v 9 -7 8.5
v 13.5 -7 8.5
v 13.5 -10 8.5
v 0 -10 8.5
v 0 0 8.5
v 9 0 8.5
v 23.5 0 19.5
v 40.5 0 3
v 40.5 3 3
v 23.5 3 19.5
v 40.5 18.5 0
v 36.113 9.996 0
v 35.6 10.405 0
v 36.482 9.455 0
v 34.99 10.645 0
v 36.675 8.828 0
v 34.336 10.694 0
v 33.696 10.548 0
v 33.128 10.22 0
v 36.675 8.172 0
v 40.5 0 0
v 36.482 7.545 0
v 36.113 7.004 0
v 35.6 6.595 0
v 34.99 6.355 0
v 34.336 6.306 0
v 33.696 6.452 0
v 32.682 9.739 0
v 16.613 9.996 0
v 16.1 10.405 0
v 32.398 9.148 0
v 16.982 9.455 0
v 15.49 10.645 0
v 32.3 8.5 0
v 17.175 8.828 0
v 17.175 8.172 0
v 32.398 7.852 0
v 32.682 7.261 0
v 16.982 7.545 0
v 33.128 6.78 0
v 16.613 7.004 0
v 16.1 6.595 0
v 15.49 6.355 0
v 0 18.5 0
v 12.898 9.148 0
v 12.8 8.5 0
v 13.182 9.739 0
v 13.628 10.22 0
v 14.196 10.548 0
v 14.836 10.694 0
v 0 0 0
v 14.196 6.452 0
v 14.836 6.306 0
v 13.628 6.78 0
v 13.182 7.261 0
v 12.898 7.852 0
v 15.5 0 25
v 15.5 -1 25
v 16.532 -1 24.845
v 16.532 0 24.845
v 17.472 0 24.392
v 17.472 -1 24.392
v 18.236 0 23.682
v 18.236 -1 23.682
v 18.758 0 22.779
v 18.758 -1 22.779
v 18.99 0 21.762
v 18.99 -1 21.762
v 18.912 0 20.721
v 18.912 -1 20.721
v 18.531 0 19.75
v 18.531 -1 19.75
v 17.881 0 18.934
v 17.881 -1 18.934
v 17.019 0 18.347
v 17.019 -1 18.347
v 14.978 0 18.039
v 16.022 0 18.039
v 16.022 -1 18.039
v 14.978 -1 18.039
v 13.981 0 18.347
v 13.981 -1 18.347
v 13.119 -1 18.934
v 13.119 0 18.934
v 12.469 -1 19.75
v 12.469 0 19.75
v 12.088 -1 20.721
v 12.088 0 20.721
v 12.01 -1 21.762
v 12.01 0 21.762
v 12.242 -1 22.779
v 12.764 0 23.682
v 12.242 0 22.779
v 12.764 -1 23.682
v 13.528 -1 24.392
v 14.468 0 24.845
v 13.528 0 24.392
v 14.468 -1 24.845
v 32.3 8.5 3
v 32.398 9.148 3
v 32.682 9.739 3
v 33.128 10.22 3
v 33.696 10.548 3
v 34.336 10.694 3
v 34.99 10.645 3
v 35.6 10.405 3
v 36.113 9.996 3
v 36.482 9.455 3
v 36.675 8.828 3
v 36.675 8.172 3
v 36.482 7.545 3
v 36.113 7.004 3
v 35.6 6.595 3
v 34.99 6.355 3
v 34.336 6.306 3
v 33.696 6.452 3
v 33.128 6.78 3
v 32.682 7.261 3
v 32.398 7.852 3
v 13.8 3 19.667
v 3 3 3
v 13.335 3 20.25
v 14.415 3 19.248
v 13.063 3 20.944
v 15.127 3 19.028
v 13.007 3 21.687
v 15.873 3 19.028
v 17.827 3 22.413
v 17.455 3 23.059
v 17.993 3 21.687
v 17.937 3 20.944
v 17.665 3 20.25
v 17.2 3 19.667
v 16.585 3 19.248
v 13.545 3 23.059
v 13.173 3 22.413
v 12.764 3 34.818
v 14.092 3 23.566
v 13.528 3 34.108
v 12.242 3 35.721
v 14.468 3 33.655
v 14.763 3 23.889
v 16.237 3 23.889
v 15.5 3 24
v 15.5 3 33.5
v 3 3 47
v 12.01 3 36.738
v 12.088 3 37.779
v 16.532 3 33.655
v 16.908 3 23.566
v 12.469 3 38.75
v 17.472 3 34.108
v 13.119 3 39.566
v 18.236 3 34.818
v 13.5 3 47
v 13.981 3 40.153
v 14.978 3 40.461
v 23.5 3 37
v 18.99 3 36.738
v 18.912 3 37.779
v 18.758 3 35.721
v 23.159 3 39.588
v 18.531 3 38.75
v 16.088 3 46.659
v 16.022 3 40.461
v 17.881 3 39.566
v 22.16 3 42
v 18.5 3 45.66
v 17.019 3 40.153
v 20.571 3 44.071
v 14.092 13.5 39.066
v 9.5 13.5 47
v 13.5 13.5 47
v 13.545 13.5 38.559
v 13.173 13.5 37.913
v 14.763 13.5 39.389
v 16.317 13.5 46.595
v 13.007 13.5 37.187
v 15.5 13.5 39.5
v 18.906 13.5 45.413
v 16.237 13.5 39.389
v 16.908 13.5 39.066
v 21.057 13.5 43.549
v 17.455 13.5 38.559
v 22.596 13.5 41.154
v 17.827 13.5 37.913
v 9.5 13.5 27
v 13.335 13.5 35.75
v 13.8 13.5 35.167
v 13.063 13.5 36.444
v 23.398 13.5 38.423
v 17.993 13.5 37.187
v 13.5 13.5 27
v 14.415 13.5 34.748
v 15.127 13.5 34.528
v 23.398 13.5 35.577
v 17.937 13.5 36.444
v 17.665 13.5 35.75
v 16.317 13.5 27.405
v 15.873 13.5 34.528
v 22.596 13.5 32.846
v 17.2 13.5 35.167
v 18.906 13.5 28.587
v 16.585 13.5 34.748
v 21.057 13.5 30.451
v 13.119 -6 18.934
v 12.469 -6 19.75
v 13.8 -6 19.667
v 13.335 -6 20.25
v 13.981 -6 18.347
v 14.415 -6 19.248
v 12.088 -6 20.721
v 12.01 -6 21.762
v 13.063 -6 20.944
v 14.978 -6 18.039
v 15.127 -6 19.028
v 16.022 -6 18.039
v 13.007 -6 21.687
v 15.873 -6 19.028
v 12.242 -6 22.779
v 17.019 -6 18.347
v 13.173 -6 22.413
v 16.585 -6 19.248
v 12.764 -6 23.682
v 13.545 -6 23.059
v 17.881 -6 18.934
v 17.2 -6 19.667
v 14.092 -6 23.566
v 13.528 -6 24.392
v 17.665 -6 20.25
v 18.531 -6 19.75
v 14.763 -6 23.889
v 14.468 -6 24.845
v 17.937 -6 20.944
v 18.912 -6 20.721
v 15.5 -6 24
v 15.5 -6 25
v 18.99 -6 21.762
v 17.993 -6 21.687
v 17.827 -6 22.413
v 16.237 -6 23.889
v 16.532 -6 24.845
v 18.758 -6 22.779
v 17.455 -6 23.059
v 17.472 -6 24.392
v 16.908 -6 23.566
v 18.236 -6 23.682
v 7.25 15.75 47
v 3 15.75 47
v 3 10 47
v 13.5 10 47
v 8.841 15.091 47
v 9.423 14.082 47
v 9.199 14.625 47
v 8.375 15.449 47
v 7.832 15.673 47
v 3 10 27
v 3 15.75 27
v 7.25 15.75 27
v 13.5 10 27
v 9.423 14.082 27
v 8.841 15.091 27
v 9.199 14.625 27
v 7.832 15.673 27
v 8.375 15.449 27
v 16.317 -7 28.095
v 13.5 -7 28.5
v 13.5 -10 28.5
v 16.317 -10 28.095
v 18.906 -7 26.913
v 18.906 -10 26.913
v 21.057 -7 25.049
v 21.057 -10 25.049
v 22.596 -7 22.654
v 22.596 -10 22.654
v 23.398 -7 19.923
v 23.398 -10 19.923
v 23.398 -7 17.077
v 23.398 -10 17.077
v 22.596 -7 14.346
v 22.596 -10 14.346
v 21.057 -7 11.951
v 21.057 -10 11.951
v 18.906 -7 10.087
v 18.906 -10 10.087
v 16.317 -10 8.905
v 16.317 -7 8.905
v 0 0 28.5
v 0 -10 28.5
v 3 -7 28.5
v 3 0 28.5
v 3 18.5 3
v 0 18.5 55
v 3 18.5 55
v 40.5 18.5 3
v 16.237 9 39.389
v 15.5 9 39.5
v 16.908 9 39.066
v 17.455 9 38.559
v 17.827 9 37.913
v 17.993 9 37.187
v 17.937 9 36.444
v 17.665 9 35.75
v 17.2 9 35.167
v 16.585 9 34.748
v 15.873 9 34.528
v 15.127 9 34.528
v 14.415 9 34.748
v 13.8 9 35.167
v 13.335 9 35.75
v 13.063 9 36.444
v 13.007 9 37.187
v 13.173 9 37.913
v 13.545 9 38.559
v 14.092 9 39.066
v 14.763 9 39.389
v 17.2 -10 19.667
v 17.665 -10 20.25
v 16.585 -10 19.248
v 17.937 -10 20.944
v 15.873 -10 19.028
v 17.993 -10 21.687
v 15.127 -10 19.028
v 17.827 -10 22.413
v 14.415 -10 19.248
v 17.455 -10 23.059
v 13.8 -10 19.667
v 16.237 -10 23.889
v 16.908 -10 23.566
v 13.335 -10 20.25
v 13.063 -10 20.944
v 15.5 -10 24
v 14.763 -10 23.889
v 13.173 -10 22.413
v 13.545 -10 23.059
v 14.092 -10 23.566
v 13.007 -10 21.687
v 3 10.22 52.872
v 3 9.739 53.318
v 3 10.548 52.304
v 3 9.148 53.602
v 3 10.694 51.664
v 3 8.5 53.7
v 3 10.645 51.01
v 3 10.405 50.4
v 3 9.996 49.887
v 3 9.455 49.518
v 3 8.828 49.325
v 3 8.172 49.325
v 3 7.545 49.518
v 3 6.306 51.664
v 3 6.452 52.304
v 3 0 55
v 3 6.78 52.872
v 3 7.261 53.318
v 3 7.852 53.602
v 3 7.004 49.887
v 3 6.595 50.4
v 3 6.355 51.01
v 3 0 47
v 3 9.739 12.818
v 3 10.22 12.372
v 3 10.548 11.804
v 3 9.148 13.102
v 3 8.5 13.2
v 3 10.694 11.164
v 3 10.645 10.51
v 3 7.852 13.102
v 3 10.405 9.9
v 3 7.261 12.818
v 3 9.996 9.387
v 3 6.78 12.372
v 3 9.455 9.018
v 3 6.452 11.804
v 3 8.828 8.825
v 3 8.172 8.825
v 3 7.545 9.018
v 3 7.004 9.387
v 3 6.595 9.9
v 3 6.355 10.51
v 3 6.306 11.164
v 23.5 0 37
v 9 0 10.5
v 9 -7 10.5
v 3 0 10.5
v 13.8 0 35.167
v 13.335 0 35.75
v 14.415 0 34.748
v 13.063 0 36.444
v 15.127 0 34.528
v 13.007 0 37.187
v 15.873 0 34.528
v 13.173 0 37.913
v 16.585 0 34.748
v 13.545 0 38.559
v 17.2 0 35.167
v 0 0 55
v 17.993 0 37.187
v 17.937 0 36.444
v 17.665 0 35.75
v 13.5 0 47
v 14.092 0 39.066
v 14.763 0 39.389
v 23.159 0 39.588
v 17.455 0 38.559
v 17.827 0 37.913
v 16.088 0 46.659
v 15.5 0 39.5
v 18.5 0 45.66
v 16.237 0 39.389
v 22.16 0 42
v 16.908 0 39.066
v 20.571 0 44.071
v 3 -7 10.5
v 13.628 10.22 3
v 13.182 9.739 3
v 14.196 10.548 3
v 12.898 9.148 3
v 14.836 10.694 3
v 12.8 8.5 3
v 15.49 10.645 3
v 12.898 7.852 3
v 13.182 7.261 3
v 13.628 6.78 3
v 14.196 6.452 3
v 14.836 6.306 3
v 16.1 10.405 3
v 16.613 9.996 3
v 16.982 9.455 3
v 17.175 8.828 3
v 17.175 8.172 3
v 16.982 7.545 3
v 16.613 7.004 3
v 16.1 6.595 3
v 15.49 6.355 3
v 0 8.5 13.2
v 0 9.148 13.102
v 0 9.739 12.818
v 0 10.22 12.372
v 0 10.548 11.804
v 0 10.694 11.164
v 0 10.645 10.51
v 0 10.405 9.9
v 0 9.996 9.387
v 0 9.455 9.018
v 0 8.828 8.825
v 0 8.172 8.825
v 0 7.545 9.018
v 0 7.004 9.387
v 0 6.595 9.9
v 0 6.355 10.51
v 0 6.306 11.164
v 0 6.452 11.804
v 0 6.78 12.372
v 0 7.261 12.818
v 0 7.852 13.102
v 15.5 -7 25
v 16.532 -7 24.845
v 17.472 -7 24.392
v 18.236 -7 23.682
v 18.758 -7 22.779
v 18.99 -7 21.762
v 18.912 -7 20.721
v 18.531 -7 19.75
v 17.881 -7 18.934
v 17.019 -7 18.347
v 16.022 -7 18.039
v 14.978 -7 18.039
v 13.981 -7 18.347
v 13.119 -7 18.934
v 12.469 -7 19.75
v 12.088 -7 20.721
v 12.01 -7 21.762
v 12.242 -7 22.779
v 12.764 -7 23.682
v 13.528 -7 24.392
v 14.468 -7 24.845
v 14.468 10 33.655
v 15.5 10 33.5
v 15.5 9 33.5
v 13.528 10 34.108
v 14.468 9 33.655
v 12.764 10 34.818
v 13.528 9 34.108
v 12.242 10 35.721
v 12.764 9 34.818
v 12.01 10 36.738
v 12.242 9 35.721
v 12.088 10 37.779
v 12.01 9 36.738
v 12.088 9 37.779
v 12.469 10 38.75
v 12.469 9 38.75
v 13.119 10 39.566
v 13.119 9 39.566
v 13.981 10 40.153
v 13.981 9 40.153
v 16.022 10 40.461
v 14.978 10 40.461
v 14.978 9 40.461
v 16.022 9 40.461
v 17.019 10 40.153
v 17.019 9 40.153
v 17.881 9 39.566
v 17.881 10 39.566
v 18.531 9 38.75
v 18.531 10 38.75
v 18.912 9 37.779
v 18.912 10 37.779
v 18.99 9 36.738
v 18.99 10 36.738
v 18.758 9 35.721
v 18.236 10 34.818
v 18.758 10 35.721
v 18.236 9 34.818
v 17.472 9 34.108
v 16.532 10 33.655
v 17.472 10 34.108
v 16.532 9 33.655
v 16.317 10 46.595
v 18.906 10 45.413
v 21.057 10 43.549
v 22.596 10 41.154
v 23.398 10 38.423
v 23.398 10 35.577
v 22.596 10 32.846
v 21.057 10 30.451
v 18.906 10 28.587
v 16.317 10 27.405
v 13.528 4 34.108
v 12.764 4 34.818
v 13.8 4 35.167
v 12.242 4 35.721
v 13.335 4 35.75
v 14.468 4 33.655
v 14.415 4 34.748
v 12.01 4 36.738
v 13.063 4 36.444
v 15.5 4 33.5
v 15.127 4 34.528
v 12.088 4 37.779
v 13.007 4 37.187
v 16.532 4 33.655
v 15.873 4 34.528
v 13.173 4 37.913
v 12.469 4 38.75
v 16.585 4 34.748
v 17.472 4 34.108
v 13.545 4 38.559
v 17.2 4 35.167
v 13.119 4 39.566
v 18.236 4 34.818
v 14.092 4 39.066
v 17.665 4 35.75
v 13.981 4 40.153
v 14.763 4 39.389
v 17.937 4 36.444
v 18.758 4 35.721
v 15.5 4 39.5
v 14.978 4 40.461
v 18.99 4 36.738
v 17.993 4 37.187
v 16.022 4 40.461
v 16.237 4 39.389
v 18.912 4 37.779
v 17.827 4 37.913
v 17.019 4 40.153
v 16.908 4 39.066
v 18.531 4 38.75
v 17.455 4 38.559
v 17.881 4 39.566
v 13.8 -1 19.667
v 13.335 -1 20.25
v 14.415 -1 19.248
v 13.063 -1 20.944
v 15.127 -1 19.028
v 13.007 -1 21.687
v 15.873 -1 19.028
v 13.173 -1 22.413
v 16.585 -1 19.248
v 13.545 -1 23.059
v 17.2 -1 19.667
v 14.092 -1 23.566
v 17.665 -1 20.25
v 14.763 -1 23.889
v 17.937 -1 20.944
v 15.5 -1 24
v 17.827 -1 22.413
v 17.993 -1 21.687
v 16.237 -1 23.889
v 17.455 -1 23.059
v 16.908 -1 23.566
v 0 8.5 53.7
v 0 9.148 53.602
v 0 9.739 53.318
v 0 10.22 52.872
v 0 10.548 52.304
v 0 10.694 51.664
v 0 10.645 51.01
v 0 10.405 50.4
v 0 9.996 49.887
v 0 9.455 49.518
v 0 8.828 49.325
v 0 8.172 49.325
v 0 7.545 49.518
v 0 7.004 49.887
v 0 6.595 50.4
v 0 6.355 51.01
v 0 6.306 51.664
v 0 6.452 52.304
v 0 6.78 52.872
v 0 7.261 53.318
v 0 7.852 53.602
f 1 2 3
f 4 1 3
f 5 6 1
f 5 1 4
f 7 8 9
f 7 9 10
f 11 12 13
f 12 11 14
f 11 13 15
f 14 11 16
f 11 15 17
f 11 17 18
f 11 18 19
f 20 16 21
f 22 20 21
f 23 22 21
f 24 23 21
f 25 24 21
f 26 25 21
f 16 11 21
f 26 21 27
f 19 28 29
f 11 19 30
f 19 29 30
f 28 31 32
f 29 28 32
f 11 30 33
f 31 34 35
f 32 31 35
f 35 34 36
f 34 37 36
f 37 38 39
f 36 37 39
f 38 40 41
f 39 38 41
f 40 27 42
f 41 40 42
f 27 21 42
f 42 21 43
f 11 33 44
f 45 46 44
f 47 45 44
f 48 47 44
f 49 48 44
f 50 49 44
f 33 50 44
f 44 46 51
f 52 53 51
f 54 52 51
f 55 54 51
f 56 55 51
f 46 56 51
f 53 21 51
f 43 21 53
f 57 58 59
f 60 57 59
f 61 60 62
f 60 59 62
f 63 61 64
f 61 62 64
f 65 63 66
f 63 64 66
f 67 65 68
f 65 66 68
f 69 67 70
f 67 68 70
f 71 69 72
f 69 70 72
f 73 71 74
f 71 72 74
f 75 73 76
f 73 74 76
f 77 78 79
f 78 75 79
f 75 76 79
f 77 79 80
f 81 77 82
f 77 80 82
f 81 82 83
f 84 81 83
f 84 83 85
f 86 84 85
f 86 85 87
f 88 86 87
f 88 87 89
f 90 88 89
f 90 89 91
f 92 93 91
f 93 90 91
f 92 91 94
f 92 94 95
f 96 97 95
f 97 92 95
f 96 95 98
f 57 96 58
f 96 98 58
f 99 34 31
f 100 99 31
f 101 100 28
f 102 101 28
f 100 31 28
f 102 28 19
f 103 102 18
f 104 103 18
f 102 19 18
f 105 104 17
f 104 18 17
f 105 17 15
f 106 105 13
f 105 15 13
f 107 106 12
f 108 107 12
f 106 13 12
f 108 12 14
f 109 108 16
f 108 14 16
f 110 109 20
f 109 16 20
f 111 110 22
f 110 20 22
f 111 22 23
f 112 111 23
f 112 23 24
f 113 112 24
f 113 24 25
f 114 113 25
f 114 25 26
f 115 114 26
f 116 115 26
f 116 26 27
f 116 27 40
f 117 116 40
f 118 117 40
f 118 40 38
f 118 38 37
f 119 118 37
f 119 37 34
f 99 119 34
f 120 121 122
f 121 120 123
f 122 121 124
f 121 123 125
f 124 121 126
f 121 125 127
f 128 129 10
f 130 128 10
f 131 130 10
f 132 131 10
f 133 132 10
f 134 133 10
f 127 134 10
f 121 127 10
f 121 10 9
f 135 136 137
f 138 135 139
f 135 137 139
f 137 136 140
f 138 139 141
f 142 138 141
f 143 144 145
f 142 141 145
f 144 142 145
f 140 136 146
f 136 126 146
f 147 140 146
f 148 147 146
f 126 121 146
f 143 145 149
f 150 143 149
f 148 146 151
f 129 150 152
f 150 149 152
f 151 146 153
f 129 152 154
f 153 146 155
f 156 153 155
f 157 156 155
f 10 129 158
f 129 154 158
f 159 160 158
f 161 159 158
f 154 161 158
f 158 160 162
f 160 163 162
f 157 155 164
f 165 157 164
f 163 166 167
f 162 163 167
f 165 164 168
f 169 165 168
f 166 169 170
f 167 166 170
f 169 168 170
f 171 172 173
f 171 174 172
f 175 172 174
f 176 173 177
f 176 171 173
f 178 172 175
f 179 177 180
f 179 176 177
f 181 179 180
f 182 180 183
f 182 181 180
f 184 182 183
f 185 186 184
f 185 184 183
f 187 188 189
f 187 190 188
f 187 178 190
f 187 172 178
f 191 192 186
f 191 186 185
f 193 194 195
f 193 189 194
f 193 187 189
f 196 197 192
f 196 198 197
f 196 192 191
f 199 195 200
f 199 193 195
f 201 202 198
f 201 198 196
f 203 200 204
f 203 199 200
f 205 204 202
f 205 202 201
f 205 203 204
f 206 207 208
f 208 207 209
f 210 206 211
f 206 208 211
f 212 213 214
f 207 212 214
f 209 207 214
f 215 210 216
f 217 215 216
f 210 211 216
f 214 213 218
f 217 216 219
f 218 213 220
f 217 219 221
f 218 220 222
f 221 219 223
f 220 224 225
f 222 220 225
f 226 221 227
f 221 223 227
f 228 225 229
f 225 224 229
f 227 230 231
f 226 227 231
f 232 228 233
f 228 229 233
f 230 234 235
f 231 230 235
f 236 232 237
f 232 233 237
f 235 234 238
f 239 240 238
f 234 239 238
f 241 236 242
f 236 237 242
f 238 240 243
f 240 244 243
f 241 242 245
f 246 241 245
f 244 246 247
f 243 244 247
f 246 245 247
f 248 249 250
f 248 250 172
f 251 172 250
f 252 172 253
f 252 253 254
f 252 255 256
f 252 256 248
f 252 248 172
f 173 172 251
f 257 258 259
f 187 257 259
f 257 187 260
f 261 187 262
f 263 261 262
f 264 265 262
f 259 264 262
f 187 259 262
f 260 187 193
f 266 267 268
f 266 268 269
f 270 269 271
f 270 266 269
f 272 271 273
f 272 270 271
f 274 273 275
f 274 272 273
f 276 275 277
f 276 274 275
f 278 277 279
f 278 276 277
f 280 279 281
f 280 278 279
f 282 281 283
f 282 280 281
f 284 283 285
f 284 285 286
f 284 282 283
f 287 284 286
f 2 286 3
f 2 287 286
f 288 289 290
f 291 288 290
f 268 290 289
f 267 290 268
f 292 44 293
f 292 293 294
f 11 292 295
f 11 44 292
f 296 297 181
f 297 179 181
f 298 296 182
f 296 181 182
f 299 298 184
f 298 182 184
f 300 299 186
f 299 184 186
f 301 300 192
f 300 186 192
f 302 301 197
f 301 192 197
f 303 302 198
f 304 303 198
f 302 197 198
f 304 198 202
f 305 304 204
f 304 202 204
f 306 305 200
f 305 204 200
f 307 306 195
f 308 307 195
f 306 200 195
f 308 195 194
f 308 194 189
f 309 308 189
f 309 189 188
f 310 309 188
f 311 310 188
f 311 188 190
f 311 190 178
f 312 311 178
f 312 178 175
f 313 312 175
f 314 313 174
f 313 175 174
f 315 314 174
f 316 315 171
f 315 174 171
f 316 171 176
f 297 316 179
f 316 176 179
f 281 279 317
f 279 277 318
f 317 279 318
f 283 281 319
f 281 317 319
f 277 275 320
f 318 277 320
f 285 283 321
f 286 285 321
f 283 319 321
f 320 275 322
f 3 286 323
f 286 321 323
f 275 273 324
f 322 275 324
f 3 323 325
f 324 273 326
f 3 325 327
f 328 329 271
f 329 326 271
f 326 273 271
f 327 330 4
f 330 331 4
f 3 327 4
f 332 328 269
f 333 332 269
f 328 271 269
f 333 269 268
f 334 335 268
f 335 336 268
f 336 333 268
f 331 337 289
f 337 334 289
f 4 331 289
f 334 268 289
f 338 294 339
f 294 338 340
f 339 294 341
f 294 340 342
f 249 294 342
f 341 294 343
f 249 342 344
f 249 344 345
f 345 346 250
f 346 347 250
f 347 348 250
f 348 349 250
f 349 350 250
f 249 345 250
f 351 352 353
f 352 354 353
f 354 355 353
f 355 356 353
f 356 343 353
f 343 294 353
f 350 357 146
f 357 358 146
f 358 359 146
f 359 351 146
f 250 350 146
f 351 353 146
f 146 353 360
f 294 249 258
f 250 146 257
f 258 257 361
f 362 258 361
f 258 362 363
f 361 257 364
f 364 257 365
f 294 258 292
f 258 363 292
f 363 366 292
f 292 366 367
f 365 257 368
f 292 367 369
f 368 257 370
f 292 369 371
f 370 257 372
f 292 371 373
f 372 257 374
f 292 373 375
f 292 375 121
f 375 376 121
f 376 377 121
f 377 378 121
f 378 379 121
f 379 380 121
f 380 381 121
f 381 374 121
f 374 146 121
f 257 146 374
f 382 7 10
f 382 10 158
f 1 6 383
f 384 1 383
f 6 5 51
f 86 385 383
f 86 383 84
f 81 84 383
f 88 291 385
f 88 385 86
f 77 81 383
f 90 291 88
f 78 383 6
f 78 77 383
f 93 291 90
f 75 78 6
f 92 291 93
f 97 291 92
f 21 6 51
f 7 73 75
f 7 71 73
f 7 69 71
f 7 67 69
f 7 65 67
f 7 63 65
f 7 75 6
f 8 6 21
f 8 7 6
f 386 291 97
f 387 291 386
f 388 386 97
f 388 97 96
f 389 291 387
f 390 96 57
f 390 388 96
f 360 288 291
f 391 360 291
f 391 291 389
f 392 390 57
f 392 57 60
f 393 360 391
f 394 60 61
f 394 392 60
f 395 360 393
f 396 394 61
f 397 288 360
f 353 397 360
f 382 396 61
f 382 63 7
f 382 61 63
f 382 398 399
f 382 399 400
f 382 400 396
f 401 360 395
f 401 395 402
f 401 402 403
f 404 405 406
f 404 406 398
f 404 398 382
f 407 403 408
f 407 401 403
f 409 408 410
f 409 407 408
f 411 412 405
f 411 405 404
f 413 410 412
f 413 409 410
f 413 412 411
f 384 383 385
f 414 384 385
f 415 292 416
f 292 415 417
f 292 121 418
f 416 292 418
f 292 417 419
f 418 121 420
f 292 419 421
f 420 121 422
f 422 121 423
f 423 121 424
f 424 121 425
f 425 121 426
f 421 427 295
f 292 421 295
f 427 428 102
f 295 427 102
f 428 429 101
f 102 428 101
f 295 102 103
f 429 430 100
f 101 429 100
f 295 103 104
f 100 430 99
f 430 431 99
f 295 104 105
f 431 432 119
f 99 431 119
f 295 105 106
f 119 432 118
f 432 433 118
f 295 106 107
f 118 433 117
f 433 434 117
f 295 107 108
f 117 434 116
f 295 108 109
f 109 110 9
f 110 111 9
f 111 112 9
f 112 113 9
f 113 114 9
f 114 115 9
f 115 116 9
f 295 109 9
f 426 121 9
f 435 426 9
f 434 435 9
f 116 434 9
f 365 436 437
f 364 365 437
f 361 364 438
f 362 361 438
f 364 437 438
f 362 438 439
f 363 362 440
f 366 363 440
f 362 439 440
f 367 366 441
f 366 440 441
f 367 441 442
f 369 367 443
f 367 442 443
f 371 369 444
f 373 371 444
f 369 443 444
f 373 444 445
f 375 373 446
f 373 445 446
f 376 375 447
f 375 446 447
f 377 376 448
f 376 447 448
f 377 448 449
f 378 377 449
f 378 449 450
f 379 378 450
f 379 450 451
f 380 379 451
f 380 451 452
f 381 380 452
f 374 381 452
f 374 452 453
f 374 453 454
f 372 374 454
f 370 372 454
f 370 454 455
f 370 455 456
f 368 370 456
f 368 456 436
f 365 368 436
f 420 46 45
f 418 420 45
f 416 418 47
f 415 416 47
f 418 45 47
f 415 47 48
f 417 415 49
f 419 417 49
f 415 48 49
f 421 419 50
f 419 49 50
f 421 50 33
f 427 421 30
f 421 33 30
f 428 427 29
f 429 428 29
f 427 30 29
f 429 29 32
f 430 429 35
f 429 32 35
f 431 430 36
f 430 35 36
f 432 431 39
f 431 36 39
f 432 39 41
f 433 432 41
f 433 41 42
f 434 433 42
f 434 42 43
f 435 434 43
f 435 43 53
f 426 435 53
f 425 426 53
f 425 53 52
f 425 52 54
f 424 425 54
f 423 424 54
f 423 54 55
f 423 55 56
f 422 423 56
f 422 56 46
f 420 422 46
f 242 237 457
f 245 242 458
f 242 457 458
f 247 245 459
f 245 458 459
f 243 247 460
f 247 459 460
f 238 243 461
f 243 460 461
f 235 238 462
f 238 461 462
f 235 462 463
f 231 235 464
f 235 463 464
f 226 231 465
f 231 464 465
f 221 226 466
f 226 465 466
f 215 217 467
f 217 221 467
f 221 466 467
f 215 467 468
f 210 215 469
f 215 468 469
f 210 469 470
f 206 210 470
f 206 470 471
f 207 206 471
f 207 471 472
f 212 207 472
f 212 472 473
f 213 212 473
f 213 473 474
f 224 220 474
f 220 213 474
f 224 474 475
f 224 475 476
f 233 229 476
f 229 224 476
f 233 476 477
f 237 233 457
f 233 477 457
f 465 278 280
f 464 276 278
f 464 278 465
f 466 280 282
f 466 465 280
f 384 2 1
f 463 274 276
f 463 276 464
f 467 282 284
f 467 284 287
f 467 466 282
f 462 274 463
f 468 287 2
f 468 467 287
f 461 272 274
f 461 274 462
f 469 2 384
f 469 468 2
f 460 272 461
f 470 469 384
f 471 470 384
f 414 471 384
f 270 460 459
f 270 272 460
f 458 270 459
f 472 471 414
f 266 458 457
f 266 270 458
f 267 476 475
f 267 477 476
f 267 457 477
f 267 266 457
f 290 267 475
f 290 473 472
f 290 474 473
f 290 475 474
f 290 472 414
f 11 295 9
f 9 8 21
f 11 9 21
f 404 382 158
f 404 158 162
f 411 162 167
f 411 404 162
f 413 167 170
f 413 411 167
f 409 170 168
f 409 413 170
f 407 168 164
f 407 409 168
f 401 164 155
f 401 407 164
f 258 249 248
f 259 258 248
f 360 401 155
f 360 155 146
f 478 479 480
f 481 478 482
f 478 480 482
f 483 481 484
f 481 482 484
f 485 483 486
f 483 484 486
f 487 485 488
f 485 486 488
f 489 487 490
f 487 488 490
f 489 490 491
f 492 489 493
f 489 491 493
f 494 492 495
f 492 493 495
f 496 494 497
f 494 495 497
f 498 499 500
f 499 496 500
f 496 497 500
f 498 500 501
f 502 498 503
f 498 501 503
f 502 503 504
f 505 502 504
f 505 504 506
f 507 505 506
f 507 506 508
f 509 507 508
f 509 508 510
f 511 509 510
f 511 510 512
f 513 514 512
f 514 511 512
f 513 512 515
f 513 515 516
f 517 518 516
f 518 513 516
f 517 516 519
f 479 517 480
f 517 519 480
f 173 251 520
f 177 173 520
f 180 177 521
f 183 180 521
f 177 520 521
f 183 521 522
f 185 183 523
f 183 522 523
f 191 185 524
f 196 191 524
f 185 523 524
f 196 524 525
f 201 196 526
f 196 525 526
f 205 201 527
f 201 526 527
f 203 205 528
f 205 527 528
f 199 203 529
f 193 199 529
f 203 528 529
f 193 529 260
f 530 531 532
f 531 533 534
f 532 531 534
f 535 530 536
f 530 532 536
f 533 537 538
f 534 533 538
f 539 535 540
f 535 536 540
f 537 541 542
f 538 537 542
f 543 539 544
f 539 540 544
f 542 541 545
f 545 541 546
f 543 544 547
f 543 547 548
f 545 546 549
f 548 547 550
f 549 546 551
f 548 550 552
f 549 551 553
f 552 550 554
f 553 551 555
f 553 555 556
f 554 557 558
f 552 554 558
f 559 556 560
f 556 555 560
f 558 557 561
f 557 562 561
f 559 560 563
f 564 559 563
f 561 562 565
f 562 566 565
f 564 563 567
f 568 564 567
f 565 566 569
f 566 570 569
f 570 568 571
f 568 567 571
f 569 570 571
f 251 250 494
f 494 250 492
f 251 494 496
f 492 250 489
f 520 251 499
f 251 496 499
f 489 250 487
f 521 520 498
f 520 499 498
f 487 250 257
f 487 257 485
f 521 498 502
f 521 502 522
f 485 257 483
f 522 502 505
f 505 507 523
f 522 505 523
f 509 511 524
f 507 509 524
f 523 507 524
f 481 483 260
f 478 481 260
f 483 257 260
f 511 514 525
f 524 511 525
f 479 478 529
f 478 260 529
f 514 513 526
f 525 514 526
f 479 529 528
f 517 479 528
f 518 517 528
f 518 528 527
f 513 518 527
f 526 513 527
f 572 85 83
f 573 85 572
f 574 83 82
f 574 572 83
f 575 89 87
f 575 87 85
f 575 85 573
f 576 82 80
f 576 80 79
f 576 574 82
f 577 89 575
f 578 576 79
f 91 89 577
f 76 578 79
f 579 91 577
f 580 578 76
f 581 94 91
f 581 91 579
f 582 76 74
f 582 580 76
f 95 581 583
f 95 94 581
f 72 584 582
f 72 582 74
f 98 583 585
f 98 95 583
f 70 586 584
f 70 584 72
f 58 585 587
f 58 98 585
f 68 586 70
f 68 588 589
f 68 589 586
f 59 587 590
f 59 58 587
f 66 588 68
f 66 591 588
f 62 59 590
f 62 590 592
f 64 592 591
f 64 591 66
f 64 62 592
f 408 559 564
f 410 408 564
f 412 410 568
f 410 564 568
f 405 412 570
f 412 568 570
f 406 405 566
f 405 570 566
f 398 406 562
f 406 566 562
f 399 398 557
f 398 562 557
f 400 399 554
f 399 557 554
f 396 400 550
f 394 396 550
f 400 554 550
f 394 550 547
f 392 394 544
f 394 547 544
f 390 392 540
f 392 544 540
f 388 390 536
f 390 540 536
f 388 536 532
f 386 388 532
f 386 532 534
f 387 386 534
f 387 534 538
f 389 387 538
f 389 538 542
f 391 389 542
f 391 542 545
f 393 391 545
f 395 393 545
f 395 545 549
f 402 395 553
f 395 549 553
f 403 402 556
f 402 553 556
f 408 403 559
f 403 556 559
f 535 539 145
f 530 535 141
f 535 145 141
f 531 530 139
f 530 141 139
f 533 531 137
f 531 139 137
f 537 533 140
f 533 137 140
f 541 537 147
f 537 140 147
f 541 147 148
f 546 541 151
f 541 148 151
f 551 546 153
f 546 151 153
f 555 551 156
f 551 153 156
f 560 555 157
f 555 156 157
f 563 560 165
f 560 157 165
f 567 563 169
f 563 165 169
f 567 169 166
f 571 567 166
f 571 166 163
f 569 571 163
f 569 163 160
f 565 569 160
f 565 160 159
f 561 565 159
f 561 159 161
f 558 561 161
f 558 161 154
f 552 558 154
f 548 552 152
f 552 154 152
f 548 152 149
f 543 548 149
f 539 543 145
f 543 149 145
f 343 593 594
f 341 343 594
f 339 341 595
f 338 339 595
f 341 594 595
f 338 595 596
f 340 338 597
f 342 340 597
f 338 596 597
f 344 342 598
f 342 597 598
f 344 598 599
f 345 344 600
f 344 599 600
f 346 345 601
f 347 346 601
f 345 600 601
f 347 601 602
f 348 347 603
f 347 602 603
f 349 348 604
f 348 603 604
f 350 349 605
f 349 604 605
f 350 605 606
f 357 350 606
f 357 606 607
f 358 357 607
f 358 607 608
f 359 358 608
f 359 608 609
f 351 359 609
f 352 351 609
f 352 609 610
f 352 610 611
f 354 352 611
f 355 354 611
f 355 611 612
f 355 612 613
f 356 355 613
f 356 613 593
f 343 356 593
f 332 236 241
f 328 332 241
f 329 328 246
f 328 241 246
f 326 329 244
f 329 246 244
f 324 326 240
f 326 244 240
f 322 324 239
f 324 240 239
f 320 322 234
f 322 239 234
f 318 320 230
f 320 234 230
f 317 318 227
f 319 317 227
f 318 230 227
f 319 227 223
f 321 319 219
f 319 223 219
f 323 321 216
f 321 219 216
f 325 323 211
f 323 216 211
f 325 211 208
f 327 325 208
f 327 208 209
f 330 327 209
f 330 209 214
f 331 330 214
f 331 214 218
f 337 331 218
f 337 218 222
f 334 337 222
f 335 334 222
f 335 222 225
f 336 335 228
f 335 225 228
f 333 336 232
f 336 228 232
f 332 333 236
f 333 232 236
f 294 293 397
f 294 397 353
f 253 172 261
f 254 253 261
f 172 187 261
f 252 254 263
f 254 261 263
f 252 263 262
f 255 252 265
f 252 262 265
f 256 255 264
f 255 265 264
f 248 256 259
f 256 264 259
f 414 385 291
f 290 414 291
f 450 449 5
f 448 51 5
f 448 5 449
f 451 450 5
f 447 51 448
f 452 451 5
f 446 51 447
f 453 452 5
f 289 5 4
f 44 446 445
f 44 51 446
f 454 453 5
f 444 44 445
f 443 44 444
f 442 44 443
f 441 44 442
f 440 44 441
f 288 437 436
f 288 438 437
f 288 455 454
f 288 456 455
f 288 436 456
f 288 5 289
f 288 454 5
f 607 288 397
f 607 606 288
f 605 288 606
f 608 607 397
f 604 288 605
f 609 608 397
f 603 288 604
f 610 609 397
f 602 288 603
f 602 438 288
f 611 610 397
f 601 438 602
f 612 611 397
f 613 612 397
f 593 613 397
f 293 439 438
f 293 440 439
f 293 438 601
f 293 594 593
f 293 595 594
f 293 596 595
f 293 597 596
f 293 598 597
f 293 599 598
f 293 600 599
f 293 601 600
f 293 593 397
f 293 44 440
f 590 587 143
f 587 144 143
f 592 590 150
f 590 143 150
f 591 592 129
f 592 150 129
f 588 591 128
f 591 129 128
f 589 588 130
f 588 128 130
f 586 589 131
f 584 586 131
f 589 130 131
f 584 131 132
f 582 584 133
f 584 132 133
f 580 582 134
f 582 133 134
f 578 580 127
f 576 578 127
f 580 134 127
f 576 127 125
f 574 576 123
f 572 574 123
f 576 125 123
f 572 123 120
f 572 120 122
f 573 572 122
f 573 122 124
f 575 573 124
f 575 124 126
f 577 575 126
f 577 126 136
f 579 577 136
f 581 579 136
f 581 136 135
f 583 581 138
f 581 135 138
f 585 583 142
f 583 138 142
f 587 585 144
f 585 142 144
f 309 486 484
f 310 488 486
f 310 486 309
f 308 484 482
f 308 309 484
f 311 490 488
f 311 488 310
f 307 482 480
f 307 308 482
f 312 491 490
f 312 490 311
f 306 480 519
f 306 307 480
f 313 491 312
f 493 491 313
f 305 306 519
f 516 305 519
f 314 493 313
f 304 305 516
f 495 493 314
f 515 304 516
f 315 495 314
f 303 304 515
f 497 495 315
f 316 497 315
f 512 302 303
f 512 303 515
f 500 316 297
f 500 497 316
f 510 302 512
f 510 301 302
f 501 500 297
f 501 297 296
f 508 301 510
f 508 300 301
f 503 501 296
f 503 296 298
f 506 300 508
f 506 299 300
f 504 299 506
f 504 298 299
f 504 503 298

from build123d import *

# Parameters (mm, degrees)
BOSS_EXTRUDE1_DEPTH = 18.5
BOSS_EXTRUDE2_DEPTH = 3
BOSS_EXTRUDE3_START = 7
BOSS_EXTRUDE3_DEPTH = 3.5
SKETCH4_W           = 6.5
SKETCH4_H           = 2.25
BOSS_EXTRUDE4_DEPTH = 20
FILLET1_R           = 2.25
BOSS_EXTRUDE5_DEPTH = 7
BOSS_EXTRUDE6_DEPTH = 3
SKETCH7_R           = 2.5
CUT_EXTRUDE1_DEPTH  = 73.232264259
SKETCH8_R           = 2.2
CUT_EXTRUDE2_DEPTH  = 71.763691255
CUT_EXTRUDE3_REACH  = 72.764
SKETCH9_R           = 2.2
BOSS_EXTRUDE7_REACH = 74.907
SKETCH10_R          = 3.5
SKETCH10_R_2        = 2.5
BOSS_EXTRUDE8_REACH = 72.039
SKETCH11_R          = 3.5
SKETCH11_R_2        = 2.5
CUT_EXTRUDE4_REACH  = 66.742
SKETCH12_W          = 7
SKETCH12_H          = 5


with BuildPart() as part:
    # Sketch1 → Boss-Extrude1 (new body)
    with BuildSketch(Plane(origin=(0, 0, 0), x_dir=(1, 0, 0), z_dir=(0, 1, 0))):
        Polygon((40.5, 0), (0, 0), (0, -55), (3, -55), (3, -3), (40.5, -3), align=None)
    extrude(amount=BOSS_EXTRUDE1_DEPTH)

    # Sketch2 → Boss-Extrude2 (add)
    with BuildSketch(Plane.XZ):
        with BuildLine():
            Line((40.5, 3), (23.5, 19.5))
            Line((23.5, 19.5), (23.5, 37))
            ThreePointArc((23.5, 37), (20.571067812, 44.071067812), (13.5, 47))
            Line((13.5, 47), (3, 47))
            Line((3, 47), (3, 3))
            Line((3, 3), (40.5, 3))
        make_face()
    extrude(amount=-BOSS_EXTRUDE2_DEPTH)

    # Sketch3 → Boss-Extrude3 (add)
    with BuildSketch(Plane(origin=(0, 3, 0), x_dir=(1, 0, 0), z_dir=(0, 1, 0)).offset(BOSS_EXTRUDE3_START)):
        with BuildLine():
            Line((3, -47), (13.5, -47))
            ThreePointArc((13.5, -47), (23.5, -37), (13.5, -27))
            Line((13.5, -27), (3, -27))
            Line((3, -27), (3, -47))
        make_face()
    extrude(amount=BOSS_EXTRUDE3_DEPTH)

    # Sketch4 → Boss-Extrude4 (add)
    with BuildSketch(Plane.XY.offset(47)):
        with Locations((6.25, 14.625)):
            Rectangle(SKETCH4_W, SKETCH4_H)
    extrude(amount=-BOSS_EXTRUDE4_DEPTH)

    # Fillet1
    fillet1_edges = [part.edges().sort_by_distance(p)[0] for p in [
        (9.5, 15.75, 37),
    ]]
    fillet(fillet1_edges, radius=FILLET1_R - 0.0001)  # a hair under: the kernel refuses the full size

    # Sketch5 → Boss-Extrude5 (add)
    with BuildSketch(Plane.XZ):
        Polygon((0, 28.5), (0, 8.5), (9, 8.5), (9, 10.5), (3, 10.5), (3, 28.5), align=None)
    extrude(amount=BOSS_EXTRUDE5_DEPTH)

    # Sketch6 → Boss-Extrude6 (add)
    with BuildSketch(Plane.XZ.offset(7)):
        with BuildLine():
            Line((0, 8.5), (0, 28.5))
            Line((0, 28.5), (13.5, 28.5))
            ThreePointArc((13.5, 28.5), (23.5, 18.5), (13.5, 8.5))
            Line((13.5, 8.5), (0, 8.5))
        make_face()
    extrude(amount=BOSS_EXTRUDE6_DEPTH)

    # Sketch7 → Cut-Extrude1 (cut, through all)
    with BuildSketch(Plane(origin=(0, 13.5, 0), x_dir=(1, 0, 0), z_dir=(0, 1, 0))):
        with Locations(Location((15.5, -21.5, 0), (0, 0, 270))):
            Circle(SKETCH7_R)
        with Locations(Location((15.5, -37, 0), (0, 0, 270))):
            Circle(SKETCH7_R)
    extrude(amount=-CUT_EXTRUDE1_DEPTH, mode=Mode.SUBTRACT)

    # Sketch8 → Cut-Extrude2 (cut, through all)
    with BuildSketch(Plane.ZY):
        with Locations((11, 8.5)):
            Circle(SKETCH8_R)
        with Locations((51.5, 8.5)):
            Circle(SKETCH8_R)
    extrude(amount=-CUT_EXTRUDE2_DEPTH, mode=Mode.SUBTRACT)

    # Sketch9 → Cut-Extrude3 (cut, up to next)
    with BuildSketch(Plane(origin=(0, 0, 0), x_dir=(-1, 0, 0), z_dir=(0, 0, -1)), mode=Mode.PRIVATE) as cut_extrude3_sk1:
        with Locations((-34.5, 8.5)):
            Circle(SKETCH9_R)
    cut_extrude3_tool1 = extrude(cut_extrude3_sk1.sketch, amount=-CUT_EXTRUDE3_REACH, mode=Mode.PRIVATE) & part.part
    # Sketch9 → Cut-Extrude3 (cut, up to next)
    with BuildSketch(Plane(origin=(0, 0, 0), x_dir=(-1, 0, 0), z_dir=(0, 0, -1)), mode=Mode.PRIVATE) as cut_extrude3_sk2:
        with Locations((-15, 8.5)):
            Circle(SKETCH9_R)
    cut_extrude3_tool2 = extrude(cut_extrude3_sk2.sketch, amount=-CUT_EXTRUDE3_REACH, mode=Mode.PRIVATE) & part.part
    add(cut_extrude3_tool1.solids().sort_by_distance((34.5, 8.5, 0))[0], mode=Mode.SUBTRACT)
    add(cut_extrude3_tool2.solids().sort_by_distance((15, 8.5, 0))[0], mode=Mode.SUBTRACT)

    # Sketch10 → Boss-Extrude7 (add, up to next)
    with BuildSketch(Plane(origin=(0, -7, 0), x_dir=(1, 0, 0), z_dir=(0, 1, 0)), mode=Mode.PRIVATE) as boss_extrude7_sk1:
        with Locations(Location((15.5, -21.5, 0), (0, 0, 270))):
            Circle(SKETCH10_R)
        with Locations(Location((15.5, -21.5, 0), (0, 0, 270))):
            Circle(SKETCH10_R_2, mode=Mode.SUBTRACT)
    boss_extrude7_tool1 = extrude(boss_extrude7_sk1.sketch, amount=BOSS_EXTRUDE7_REACH, mode=Mode.PRIVATE) - part.part
    add(boss_extrude7_tool1.solids().sort_by_distance((15.5, -7, 18.098995))[0])

    # Sketch11 → Boss-Extrude8 (add, up to next)
    with BuildSketch(Plane(origin=(0, 3, 0), x_dir=(1, 0, 0), z_dir=(0, 1, 0)), mode=Mode.PRIVATE) as boss_extrude8_sk1:
        with Locations(Location((15.5, -37, 0), (0, 0, 90))):
            Circle(SKETCH11_R)
        with Locations(Location((15.5, -37, 0), (0, 0, 270))):
            Circle(SKETCH11_R_2, mode=Mode.SUBTRACT)
    boss_extrude8_tool1 = extrude(boss_extrude8_sk1.sketch, amount=BOSS_EXTRUDE8_REACH, mode=Mode.PRIVATE) - part.part
    add(boss_extrude8_tool1.solids().sort_by_distance((15.5, 3, 40.401005))[0])

    # Cut-Extrude4: up to this face of the body (flat: up to its plane)
    cut_extrude4_end = Plane(part.part.faces().sort_by_distance((21.584376674, 10.874217494, 3))[0])
    # Sketch12 → Cut-Extrude4 (cut, up to the picked face)
    with BuildSketch(Plane.XY.offset(47), mode=Mode.PRIVATE) as cut_extrude4_sk1:
        with Locations((15.5, -3.5)):
            Rectangle(SKETCH12_W, SKETCH12_H)
    cut_extrude4_tool1 = split(extrude(cut_extrude4_sk1.sketch, amount=-CUT_EXTRUDE4_REACH, mode=Mode.PRIVATE), bisect_by=cut_extrude4_end, keep=Keep.BOTH, mode=Mode.PRIVATE)
    # Sketch12 → Cut-Extrude4 (cut, up to the picked face)
    with BuildSketch(Plane.XY.offset(47), mode=Mode.PRIVATE) as cut_extrude4_sk2:
        with Locations((15.5, 6.5)):
            Rectangle(SKETCH12_W, SKETCH12_H)
    cut_extrude4_tool2 = split(extrude(cut_extrude4_sk2.sketch, amount=-CUT_EXTRUDE4_REACH, mode=Mode.PRIVATE), bisect_by=cut_extrude4_end, keep=Keep.BOTH, mode=Mode.PRIVATE)
    add(cut_extrude4_tool1.solids().sort_by(Axis((15.5, -3.5, 47), (0, 0, -1)))[0], mode=Mode.SUBTRACT)
    add(cut_extrude4_tool2.solids().sort_by(Axis((15.5, 6.5, 47), (0, 0, -1)))[0], mode=Mode.SUBTRACT)


solid = part.part
